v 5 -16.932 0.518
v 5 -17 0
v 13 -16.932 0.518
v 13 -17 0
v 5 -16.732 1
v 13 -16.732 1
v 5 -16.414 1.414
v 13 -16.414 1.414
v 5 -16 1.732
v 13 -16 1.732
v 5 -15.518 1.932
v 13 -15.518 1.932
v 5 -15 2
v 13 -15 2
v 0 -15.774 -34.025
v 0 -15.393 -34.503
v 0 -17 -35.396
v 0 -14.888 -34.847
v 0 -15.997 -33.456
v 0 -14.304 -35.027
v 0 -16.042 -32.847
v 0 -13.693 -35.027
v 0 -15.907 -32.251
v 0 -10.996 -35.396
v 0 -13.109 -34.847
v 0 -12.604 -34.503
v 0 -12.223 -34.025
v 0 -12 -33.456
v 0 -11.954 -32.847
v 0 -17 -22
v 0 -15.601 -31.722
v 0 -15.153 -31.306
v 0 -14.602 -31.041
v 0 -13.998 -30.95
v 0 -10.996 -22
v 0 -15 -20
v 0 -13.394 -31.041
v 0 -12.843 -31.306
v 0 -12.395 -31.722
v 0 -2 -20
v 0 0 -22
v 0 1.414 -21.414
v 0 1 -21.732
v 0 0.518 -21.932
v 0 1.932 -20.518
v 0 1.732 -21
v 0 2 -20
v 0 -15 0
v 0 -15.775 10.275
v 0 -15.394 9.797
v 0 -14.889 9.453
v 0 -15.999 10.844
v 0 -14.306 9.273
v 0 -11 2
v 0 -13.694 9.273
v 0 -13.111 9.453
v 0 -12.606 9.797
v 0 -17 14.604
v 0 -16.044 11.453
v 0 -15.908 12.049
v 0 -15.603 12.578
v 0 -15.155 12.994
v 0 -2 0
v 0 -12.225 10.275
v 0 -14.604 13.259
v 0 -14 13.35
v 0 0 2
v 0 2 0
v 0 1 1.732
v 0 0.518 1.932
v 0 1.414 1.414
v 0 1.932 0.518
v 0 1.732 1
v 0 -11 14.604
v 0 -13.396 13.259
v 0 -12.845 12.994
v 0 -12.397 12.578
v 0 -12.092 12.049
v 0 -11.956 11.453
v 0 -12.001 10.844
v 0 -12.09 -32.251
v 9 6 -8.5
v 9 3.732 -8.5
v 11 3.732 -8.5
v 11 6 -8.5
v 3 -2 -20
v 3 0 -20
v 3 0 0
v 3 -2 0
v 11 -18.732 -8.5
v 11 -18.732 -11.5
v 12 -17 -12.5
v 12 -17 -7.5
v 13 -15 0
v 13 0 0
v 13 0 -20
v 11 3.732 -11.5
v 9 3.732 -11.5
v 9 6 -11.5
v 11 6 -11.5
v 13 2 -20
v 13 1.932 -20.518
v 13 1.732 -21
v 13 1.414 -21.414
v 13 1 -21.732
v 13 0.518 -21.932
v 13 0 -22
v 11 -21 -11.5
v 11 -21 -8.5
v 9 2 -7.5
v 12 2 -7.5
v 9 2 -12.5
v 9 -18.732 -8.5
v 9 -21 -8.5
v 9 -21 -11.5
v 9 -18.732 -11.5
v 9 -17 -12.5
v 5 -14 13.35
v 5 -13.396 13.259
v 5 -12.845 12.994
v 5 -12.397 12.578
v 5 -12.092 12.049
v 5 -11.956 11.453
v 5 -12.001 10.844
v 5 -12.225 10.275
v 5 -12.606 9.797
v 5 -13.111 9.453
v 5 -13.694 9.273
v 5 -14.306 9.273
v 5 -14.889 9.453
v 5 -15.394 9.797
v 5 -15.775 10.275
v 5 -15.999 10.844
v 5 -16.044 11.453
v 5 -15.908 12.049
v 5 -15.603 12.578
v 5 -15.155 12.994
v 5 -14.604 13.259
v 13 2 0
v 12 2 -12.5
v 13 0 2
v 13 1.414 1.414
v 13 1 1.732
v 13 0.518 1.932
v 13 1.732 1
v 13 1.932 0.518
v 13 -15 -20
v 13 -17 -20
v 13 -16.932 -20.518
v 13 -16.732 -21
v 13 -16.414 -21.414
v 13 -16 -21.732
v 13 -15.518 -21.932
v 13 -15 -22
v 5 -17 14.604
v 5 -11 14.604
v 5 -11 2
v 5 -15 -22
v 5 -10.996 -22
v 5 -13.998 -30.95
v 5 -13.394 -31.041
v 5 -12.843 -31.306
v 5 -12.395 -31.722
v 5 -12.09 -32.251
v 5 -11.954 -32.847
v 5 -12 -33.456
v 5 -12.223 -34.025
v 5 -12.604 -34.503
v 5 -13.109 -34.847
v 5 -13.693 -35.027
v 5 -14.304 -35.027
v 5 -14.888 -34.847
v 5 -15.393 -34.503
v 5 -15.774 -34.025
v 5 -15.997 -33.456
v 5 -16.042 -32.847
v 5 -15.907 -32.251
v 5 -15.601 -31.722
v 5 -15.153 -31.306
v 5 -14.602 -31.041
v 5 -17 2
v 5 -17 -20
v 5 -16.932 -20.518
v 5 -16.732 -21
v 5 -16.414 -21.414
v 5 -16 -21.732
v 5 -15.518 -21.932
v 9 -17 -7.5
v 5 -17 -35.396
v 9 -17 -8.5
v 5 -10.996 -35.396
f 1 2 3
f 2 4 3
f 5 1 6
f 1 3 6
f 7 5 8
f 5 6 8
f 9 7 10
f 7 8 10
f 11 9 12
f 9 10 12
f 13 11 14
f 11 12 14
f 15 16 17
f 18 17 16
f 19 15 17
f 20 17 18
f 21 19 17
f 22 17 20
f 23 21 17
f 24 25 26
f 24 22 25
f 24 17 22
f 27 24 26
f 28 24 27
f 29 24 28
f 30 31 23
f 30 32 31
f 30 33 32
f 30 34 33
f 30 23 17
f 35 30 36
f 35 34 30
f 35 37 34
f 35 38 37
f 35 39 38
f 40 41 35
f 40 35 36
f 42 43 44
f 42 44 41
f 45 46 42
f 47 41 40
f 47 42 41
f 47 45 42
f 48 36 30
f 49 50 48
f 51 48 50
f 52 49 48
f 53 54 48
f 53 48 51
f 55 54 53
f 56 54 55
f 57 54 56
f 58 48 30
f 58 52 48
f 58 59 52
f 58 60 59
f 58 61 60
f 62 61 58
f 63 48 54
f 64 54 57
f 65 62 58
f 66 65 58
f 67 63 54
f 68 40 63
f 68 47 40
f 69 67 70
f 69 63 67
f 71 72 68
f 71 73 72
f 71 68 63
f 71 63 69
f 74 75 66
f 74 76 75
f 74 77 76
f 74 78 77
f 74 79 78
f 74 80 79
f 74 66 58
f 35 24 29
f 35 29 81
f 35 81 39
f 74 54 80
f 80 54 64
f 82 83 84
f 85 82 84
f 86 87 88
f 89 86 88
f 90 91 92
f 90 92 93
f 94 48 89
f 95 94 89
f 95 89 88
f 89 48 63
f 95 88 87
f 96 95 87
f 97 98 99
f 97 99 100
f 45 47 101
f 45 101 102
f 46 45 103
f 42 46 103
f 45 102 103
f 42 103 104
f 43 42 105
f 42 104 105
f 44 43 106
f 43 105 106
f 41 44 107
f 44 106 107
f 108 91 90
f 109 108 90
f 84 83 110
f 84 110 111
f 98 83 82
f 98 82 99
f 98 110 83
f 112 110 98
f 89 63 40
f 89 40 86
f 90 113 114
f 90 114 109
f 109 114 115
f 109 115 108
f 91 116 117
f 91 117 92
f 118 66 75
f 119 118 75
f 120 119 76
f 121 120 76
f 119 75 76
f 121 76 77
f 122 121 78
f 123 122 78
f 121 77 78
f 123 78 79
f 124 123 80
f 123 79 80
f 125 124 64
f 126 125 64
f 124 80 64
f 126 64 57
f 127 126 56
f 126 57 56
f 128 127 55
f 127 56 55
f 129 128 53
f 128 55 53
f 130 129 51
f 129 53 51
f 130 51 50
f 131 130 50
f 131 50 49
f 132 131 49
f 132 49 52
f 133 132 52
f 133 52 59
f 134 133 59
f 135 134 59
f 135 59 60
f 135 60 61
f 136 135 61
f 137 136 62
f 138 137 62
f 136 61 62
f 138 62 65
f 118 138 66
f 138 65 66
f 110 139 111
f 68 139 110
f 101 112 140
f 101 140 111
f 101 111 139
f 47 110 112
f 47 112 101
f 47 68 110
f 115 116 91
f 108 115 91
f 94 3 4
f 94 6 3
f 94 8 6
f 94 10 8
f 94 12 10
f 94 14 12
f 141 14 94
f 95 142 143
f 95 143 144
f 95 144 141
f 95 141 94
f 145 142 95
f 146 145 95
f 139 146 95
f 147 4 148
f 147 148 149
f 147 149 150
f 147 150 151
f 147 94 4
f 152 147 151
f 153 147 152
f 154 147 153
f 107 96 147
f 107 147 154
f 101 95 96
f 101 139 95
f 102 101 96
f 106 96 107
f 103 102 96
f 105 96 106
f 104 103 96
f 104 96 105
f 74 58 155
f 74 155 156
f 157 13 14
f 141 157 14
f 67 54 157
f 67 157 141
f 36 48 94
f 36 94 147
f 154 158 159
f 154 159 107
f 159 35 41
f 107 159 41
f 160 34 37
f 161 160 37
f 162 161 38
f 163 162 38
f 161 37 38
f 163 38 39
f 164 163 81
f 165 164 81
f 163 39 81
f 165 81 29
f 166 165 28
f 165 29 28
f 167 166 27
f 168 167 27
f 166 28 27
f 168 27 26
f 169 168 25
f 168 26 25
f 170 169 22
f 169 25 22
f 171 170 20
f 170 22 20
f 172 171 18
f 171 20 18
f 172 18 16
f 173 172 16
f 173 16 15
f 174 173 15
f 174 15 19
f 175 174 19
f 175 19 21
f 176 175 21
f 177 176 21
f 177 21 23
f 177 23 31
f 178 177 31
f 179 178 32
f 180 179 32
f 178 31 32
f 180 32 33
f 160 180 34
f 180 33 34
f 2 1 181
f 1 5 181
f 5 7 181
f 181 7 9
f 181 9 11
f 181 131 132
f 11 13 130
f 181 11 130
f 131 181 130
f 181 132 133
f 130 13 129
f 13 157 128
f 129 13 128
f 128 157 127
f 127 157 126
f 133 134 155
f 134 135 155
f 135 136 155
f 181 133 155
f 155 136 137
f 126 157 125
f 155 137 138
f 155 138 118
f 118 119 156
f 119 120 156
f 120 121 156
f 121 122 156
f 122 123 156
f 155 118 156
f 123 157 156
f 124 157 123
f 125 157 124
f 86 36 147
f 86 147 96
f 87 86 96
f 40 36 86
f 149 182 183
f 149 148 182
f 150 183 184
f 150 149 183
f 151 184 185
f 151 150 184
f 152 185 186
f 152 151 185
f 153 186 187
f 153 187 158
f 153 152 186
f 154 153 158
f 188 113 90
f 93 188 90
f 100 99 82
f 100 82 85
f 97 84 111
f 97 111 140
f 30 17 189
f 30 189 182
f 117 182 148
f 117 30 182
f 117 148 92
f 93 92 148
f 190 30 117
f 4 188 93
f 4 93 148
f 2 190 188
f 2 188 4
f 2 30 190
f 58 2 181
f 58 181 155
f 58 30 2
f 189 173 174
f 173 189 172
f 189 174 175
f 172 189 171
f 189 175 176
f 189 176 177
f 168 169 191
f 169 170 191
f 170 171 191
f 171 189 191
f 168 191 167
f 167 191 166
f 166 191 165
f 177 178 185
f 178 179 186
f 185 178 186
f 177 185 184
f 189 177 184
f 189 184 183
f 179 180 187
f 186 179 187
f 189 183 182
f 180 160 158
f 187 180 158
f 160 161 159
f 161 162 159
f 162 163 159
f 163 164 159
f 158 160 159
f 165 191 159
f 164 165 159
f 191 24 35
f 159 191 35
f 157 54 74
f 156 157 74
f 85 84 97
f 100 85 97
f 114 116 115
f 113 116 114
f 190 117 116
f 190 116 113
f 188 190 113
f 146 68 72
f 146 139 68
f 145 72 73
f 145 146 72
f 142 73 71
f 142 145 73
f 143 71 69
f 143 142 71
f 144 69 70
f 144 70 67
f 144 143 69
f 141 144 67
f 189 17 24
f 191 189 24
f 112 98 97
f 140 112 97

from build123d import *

# Parameters (mm, degrees)
SKETCH1_W           = 24
SKETCH1_H           = 19
SKETCH1_W_2         = 20
SKETCH1_H_2         = 15
BOSS_EXTRUDE1_DEPTH = 13
SKETCH2_W           = 13.396276459
SKETCH2_H           = 6.003539649
SKETCH2_R           = 2.05
SKETCH2_W_2         = 12.603723541
SKETCH2_H_2         = 6
BOSS_EXTRUDE2_DEPTH = 5
SKETCH4_W           = 3
SKETCH4_H           = 20
BOSS_EXTRUDE3_DEPTH = 2
SKETCH5_W           = 2
SKETCH5_H           = 3
BOSS_EXTRUDE4_DEPTH = 4
SKETCH6_W           = 2
SKETCH6_H           = 3
BOSS_EXTRUDE5_DEPTH = 4
CHAMFER1_SIZE       = 1
CHAMFER1_SIZE2      = 1.732050808
FILLET1_R           = 2
CHAMFER2_SIZE       = 1
CHAMFER2_SIZE2      = 1.732050808


with BuildPart() as part:
    # Sketch1 → Boss-Extrude1 (new body)
    with BuildSketch(Plane(origin=(0, 0, 0), x_dir=(0, 0, -1), z_dir=(1, 0, 0))):
        with Locations((10, -7.5)):
            Rectangle(SKETCH1_W, SKETCH1_H)
        with Locations((10, -7.5)):
            Rectangle(SKETCH1_W_2, SKETCH1_H_2, mode=Mode.SUBTRACT)
    extrude(amount=BOSS_EXTRUDE1_DEPTH)

    # Sketch2 → Boss-Extrude2 (add)
    # profile 1 of 2: a face of its own
    with BuildSketch(Plane.ZY):
        with Locations((-28.698138229, -13.998230176)):
            Rectangle(SKETCH2_W, SKETCH2_H)
        with Locations((-33, -13.998230176)):
            Circle(SKETCH2_R, mode=Mode.SUBTRACT)
    # profile 2 of 2: a face of its own
    with BuildSketch(Plane.ZY):
        with Locations((8.301861771, -14)):
            Rectangle(SKETCH2_W_2, SKETCH2_H_2)
        with Locations((11.299999965, -14)):
            Circle(SKETCH2_R, mode=Mode.SUBTRACT)
    extrude(amount=-BOSS_EXTRUDE2_DEPTH)

    # Sketch4 → Boss-Extrude3 (add)
    with BuildSketch(Plane.XZ):
        with Locations((1.5, -10)):
            Rectangle(SKETCH4_W, SKETCH4_H)
    extrude(amount=BOSS_EXTRUDE3_DEPTH)

    # Sketch5 → Boss-Extrude4 (add)
    with BuildSketch(Plane(origin=(0, 2, 0), x_dir=(1, 0, 0), z_dir=(0, 1, 0))):
        with Locations((10, 10)):
            Rectangle(SKETCH5_W, SKETCH5_H)
    extrude(amount=BOSS_EXTRUDE4_DEPTH)

    # Sketch6 → Boss-Extrude5 (add)
    with BuildSketch(Plane.XZ.offset(17)):
        with Locations((10, -10)):
            Rectangle(SKETCH6_W, SKETCH6_H)
    extrude(amount=BOSS_EXTRUDE5_DEPTH)

    # Chamfer1
    chamfer1_edges = [part.edges().sort_by_distance(p)[0] for p in [
        (10, 2, -8.5),
        (11, 2, -10),
        (10, 2, -11.5),
    ]]
    chamfer1_side = [part.faces().sort_by_distance(p)[0] for p in [
        (6.431372549, 2, -10),
    ]]
    chamfer(chamfer1_edges, length=CHAMFER1_SIZE, length2=CHAMFER1_SIZE2, reference=chamfer1_side[0])

    # Fillet1
    fillet1_edges = [part.edges().sort_by_distance(p)[0] for p in [
        (6.5, 2, 2),
        (6.5, 2, -22),
        (9, -17, -22),
        (9, -17, 2),
    ]]
    fillet(fillet1_edges, radius=FILLET1_R)

    # Chamfer2
    chamfer2_edges = [part.edges().sort_by_distance(p)[0] for p in [
        (10, -17, -11.5),
        (11, -17, -10),
        (10, -17, -8.5),
    ]]
    chamfer2_side = [part.faces().sort_by_distance(p)[0] for p in [
        (4.962871287, -17, -10.245220581),
    ]]
    chamfer(chamfer2_edges, length=CHAMFER2_SIZE, length2=CHAMFER2_SIZE2, reference=chamfer2_side[0])


solid = part.part
